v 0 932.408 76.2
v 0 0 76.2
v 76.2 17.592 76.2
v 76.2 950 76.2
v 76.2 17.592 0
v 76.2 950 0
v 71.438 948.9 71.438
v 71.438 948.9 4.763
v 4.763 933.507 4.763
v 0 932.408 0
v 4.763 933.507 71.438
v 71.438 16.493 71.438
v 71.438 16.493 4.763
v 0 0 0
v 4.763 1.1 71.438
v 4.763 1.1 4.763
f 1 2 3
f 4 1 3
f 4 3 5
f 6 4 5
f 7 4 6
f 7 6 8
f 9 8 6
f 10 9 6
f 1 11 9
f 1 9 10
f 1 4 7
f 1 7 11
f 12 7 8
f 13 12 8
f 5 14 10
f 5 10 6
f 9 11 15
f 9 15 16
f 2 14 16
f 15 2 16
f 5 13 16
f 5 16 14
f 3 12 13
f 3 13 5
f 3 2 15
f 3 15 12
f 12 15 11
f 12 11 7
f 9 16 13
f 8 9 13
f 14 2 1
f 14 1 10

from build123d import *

# Parameters (mm, degrees)
CROQUIS1_W              = 76.2
CROQUIS1_H              = 76.2
CROQUIS1_W_2            = 66.675
CROQUIS1_H_2            = 66.675
SALIENTE_EXTRUIR1_DEPTH = 950
CORTAR_EXTRUIR1_REACH   = 958.093
CORTAR_EXTRUIR2_DEPTH   = 76.2


with BuildPart() as part:
    # Croquis1 → Saliente-Extruir1 (new body)
    with BuildSketch(Plane(origin=(0, 0, 0), x_dir=(1, 0, 0), z_dir=(0, 1, 0))):
        with Locations((38.1, -38.1)):
            Rectangle(CROQUIS1_W, CROQUIS1_H)
        with Locations((38.1, -38.1)):
            Rectangle(CROQUIS1_W_2, CROQUIS1_H_2, mode=Mode.SUBTRACT)
    extrude(amount=SALIENTE_EXTRUIR1_DEPTH)

    # Cortar-Extruir1: up to this face of the body (flat: up to its plane)
    cortar_extruir1_end = Plane(part.part.faces().sort_by_distance((38.1, 475, 0))[0])
    # Croquis2 → Cortar-Extruir1 (cut, up to the picked face)
    with BuildSketch(Plane.XY.offset(76.2), mode=Mode.PRIVATE) as cortar_extruir1_sk1:
        Polygon((0, 0), (76.2, 17.592156164), (76.2, 0), align=None)
    cortar_extruir1_tool1 = split(extrude(cortar_extruir1_sk1.sketch, amount=-CORTAR_EXTRUIR1_REACH, mode=Mode.PRIVATE), bisect_by=cortar_extruir1_end, keep=Keep.BOTH, mode=Mode.PRIVATE)
    add(cortar_extruir1_tool1.solids().sort_by(Axis((50.8, 5.864052, 76.2), (0, 0, -1)))[0], mode=Mode.SUBTRACT)

    # Croquis3 → Cortar-Extruir2 (cut)
    with BuildSketch(Plane.XY.offset(76.2)):
        Polygon((76.2, 950), (0, 932.407843836), (0, 950), align=None)
    extrude(amount=-CORTAR_EXTRUIR2_DEPTH, mode=Mode.SUBTRACT)


solid = part.part
